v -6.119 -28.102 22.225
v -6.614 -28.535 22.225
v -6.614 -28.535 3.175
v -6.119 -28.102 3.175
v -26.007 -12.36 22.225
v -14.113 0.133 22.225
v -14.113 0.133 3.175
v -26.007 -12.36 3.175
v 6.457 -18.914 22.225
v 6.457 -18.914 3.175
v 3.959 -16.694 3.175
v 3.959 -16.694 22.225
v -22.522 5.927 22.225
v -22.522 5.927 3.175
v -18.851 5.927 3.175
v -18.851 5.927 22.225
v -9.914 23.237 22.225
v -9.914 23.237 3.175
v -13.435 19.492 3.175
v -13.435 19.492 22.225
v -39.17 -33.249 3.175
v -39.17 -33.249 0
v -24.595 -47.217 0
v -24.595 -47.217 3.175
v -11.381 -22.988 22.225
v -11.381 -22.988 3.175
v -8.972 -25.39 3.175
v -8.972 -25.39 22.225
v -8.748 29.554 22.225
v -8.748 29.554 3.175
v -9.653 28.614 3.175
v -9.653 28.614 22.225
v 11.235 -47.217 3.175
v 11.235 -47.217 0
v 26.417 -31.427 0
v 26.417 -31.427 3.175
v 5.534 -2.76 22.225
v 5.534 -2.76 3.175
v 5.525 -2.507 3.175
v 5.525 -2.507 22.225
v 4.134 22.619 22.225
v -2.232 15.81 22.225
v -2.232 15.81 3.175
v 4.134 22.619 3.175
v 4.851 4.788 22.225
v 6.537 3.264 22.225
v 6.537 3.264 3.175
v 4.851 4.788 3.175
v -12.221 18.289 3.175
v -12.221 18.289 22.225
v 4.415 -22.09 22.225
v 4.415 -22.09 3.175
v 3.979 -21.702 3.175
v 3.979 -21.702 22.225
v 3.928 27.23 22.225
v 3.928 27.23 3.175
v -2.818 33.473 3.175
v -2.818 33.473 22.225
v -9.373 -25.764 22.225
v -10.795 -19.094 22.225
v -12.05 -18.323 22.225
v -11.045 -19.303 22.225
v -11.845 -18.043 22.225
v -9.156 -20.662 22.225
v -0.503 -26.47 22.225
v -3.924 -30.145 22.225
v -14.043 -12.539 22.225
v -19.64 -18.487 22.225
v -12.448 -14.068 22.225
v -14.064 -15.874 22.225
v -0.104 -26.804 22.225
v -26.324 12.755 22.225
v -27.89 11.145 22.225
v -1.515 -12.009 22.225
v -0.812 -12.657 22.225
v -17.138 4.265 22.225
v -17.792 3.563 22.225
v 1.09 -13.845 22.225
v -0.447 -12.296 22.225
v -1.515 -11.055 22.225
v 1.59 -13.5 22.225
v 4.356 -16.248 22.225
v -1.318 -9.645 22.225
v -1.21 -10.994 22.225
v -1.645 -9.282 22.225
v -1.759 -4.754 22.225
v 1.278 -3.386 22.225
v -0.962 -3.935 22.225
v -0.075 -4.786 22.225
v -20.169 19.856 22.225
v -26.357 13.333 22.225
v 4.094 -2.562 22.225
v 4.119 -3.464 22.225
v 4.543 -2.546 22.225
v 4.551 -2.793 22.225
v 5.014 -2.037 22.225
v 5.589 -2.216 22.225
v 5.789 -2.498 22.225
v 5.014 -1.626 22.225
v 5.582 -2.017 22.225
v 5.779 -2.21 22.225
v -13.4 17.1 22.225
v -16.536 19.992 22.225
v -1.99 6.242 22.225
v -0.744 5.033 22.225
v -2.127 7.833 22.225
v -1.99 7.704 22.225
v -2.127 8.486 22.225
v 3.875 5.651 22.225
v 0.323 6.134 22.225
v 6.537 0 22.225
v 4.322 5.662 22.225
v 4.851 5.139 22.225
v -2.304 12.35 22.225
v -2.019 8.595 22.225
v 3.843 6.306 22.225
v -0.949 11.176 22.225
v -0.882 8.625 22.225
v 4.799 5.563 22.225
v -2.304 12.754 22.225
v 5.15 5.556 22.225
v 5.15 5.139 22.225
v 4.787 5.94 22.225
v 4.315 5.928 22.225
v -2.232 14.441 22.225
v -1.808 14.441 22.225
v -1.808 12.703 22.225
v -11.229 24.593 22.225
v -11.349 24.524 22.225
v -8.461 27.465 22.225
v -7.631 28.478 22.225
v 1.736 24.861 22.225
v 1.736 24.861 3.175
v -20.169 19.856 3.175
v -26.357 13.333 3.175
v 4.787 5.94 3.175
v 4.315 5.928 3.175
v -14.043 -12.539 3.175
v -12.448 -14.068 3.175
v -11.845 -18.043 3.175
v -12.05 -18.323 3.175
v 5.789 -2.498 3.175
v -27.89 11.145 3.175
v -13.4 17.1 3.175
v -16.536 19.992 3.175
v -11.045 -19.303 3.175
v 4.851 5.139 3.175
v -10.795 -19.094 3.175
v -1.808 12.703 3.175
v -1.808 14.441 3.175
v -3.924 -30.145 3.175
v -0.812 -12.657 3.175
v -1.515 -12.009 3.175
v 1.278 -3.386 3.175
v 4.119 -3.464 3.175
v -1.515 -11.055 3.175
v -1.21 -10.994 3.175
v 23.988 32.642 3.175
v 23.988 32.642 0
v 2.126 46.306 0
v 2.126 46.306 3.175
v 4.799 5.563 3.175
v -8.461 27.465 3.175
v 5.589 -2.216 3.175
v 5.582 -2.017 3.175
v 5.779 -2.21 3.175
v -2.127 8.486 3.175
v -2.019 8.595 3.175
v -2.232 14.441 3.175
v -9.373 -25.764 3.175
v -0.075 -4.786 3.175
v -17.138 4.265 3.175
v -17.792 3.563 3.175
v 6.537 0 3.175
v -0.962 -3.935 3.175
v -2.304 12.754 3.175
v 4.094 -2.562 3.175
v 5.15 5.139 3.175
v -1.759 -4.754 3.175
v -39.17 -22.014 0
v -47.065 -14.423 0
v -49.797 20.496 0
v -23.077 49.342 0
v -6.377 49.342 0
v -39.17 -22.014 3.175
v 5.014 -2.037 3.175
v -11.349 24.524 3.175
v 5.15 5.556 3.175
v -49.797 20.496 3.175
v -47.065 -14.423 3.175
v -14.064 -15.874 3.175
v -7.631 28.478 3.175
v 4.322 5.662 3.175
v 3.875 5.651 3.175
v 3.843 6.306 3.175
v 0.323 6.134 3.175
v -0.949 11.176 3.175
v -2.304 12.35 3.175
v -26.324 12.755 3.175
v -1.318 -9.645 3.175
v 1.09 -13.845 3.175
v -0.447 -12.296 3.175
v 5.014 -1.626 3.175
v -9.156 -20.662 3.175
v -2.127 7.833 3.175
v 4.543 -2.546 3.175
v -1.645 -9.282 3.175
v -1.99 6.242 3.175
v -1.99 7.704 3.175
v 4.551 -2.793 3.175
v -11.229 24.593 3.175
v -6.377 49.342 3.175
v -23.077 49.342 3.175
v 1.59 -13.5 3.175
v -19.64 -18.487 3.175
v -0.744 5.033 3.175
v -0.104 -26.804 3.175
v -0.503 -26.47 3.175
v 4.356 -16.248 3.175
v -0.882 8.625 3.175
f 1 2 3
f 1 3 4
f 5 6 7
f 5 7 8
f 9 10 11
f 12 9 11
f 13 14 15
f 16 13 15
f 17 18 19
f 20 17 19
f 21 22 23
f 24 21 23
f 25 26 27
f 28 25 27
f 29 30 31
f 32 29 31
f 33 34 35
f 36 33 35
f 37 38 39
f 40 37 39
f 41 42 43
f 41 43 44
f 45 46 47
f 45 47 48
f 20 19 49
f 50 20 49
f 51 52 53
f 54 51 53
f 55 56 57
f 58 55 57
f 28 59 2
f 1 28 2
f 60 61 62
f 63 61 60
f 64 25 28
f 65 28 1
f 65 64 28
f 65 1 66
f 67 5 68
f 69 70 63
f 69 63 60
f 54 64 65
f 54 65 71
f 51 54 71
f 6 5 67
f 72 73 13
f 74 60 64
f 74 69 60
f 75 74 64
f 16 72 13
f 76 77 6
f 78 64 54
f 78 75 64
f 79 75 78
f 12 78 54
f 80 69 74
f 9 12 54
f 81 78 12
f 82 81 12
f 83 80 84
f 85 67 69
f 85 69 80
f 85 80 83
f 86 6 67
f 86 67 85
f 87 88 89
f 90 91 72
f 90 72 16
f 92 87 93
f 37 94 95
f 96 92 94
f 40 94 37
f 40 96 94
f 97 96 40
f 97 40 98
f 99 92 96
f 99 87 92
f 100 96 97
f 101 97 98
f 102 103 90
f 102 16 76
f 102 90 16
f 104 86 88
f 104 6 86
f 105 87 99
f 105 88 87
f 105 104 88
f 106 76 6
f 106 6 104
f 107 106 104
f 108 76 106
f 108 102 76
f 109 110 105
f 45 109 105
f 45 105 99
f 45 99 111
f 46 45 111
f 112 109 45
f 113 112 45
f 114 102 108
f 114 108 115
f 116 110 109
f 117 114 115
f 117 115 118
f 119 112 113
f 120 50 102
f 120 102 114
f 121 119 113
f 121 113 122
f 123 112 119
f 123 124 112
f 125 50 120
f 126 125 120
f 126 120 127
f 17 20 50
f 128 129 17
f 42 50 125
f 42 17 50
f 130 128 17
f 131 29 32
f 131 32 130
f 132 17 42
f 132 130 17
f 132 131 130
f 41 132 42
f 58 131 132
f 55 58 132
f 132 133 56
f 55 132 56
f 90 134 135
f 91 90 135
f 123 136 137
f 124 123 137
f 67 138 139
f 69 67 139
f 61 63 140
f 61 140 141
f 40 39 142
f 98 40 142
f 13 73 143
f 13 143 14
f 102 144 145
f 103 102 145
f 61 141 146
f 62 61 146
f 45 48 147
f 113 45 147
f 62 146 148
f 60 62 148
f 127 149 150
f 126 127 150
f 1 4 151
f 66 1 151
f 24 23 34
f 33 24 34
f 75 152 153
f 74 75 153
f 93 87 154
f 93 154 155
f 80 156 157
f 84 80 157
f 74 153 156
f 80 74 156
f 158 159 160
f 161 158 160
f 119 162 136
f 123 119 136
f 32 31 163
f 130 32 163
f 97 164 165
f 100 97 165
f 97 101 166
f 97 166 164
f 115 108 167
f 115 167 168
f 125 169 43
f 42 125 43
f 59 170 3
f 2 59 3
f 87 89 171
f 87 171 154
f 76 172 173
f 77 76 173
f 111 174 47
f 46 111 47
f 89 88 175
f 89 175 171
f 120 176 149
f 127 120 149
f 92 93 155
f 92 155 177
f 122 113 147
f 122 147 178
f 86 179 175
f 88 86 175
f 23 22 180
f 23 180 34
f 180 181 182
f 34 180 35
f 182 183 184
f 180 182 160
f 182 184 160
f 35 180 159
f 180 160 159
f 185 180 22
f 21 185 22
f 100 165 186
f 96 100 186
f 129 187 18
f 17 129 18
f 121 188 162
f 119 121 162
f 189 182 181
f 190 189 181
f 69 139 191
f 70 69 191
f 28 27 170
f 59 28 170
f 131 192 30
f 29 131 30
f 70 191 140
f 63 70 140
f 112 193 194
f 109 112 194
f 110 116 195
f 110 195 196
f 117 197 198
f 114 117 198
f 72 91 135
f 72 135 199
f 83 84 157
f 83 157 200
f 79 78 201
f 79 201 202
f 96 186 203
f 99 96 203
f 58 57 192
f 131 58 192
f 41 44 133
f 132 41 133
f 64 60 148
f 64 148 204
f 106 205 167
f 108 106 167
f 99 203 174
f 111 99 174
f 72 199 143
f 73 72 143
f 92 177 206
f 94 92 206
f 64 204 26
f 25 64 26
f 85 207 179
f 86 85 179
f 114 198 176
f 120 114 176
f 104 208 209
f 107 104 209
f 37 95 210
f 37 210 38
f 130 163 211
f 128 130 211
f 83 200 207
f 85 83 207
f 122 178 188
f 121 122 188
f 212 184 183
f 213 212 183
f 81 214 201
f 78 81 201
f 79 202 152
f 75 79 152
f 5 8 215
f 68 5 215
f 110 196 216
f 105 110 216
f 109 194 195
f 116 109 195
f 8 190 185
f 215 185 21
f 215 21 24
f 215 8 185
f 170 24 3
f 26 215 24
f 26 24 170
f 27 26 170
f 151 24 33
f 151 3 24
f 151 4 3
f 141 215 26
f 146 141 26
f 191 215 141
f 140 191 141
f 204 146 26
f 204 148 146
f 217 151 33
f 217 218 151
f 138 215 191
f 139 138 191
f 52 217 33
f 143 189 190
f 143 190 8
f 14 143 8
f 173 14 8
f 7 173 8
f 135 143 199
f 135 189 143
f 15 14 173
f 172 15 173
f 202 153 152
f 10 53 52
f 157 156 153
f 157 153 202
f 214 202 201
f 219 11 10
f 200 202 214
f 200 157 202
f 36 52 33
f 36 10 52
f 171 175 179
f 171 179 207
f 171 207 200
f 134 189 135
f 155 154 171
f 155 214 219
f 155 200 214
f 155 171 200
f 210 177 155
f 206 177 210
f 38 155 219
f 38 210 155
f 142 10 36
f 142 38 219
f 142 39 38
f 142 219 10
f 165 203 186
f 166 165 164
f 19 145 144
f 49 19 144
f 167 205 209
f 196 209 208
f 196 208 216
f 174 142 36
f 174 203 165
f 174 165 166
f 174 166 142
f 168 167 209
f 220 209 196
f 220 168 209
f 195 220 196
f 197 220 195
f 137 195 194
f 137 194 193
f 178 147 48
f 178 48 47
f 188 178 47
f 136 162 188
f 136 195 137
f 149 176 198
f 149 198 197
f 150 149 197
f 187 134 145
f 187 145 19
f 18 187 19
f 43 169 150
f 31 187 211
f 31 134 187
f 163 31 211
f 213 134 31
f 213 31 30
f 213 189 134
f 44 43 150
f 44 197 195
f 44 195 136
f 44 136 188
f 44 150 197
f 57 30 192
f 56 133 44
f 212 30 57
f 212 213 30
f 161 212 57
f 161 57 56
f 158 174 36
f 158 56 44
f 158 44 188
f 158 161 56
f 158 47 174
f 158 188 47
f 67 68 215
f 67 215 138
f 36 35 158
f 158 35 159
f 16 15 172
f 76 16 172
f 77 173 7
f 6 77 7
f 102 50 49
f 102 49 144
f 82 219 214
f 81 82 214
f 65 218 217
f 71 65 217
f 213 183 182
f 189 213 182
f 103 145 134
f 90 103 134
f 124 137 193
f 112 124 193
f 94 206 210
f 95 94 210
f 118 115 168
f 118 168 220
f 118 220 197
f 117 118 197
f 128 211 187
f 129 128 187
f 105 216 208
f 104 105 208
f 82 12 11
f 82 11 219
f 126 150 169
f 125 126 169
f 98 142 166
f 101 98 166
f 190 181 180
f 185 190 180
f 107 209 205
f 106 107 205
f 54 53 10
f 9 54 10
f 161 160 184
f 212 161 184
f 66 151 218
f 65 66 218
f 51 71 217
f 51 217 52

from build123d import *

# Parameters (mm, degrees)
F1_DEPTH = 3.175
F3_DEPTH = 19.05


with BuildPart() as f1:
    # F0 (on Top) → F1 (new body)
    with BuildSketch(Plane.XY):
        Polygon((-6.376508, 49.342029), (-23.076888, 49.342029), (-49.797498, 20.495921), (-47.064707, -14.423055), (-39.169982, -22.014137), (-39.169982, -33.248939), (-24.595104, -47.216527), (11.2348, -47.216527), (26.416963, -31.427078), (23.987817, 32.641653), (2.125504, 46.305597), align=None)
    extrude(amount=F1_DEPTH)

    # F2 (on face) → F3 (join)
    with BuildSketch(Plane.XY.offset(3.175)):
        Polygon((-8.460995, 27.465437), (-11.228689, 24.592964), (-11.348982, 24.524076), (-9.913685, 23.236642), (-13.435121, 19.491888), (-12.22126, 18.288707), (-13.399718, 17.099788), (-16.536398, 19.992249), (-20.168586, 19.855836), (-26.357489, 13.332929), (-26.323888, 12.755173), (-27.889514, 11.144508), (-22.5223, 5.927376), (-18.850569, 5.927376), (-17.138056, 4.265048), (-17.792482, 3.562842), (-14.112623, 0.133369), (-26.007337, -12.359691), (-19.639645, -18.486787), (-14.043322, -12.538724), (-12.448313, -14.067535), (-14.063996, -15.8737), (-11.844858, -18.042777), (-12.050118, -18.322865), (-11.044608, -19.302705), (-10.794753, -19.093755), (-9.155537, -20.661877), (-11.380946, -22.98818), (-8.972317, -25.390465), (-9.373238, -25.763512), (-6.614087, -28.535001), (-6.119217, -28.101891), (-3.923855, -30.145049), (-0.503454, -26.469847), (-0.103788, -26.803728), (4.414968, -22.089956), (3.978584, -21.701956), (6.45714, -18.914325), (3.959461, -16.693573), (4.355696, -16.247928), (1.59003, -13.500487), (1.090108, -13.844529), (-0.447387, -12.295595), (-0.811736, -12.657254), (-1.514613, -12.009452), (-1.514613, -11.054762), (-1.210493, -10.994076), (-1.318271, -9.644587), (-1.644679, -9.281886), (-1.758982, -4.754005), (-0.961826, -3.935312), (-0.075062, -4.786007), (1.278446, -3.385739), (4.118848, -3.463889), (4.094383, -2.561527), (4.542976, -2.546137), (4.551455, -2.793258), (5.533939, -2.759551), (5.525281, -2.507171), (5.788588, -2.498137), (5.778686, -2.209507), (5.589116, -2.216011), (5.582301, -2.017371), (5.014059, -2.036866), (5.014059, -1.625905), (6.536589, 0), (6.536589, 3.26362), (4.851062, 4.788233), (4.851062, 5.139193), (5.149924, 5.139193), (5.149924, 5.555849), (4.798602, 5.562526), (4.78719, 5.939749), (4.315158, 5.927964), (4.321792, 5.662222), (3.875091, 5.65107), (3.843151, 6.305763), (0.32336, 6.13405), (-0.74368, 5.033409), (-1.989887, 6.241571), (-1.989887, 7.703635), (-2.126578, 7.832781), (-2.126578, 8.485694), (-2.019443, 8.595361), (-0.881753, 8.62518), (-0.94862, 11.176316), (-2.304457, 12.350309), (-2.304457, 12.754479), (-1.808271, 12.702593), (-1.808271, 14.441202), (-2.231573, 14.441202), (-2.231573, 15.810389), (4.134082, 22.619085), (1.735728, 24.861378), (3.927975, 27.229989), (-2.817733, 33.473419), (-7.63093, 28.478006), (-8.747748, 29.554086), (-9.653301, 28.614251), align=None)
    extrude(amount=F3_DEPTH)


solid = f1.part
